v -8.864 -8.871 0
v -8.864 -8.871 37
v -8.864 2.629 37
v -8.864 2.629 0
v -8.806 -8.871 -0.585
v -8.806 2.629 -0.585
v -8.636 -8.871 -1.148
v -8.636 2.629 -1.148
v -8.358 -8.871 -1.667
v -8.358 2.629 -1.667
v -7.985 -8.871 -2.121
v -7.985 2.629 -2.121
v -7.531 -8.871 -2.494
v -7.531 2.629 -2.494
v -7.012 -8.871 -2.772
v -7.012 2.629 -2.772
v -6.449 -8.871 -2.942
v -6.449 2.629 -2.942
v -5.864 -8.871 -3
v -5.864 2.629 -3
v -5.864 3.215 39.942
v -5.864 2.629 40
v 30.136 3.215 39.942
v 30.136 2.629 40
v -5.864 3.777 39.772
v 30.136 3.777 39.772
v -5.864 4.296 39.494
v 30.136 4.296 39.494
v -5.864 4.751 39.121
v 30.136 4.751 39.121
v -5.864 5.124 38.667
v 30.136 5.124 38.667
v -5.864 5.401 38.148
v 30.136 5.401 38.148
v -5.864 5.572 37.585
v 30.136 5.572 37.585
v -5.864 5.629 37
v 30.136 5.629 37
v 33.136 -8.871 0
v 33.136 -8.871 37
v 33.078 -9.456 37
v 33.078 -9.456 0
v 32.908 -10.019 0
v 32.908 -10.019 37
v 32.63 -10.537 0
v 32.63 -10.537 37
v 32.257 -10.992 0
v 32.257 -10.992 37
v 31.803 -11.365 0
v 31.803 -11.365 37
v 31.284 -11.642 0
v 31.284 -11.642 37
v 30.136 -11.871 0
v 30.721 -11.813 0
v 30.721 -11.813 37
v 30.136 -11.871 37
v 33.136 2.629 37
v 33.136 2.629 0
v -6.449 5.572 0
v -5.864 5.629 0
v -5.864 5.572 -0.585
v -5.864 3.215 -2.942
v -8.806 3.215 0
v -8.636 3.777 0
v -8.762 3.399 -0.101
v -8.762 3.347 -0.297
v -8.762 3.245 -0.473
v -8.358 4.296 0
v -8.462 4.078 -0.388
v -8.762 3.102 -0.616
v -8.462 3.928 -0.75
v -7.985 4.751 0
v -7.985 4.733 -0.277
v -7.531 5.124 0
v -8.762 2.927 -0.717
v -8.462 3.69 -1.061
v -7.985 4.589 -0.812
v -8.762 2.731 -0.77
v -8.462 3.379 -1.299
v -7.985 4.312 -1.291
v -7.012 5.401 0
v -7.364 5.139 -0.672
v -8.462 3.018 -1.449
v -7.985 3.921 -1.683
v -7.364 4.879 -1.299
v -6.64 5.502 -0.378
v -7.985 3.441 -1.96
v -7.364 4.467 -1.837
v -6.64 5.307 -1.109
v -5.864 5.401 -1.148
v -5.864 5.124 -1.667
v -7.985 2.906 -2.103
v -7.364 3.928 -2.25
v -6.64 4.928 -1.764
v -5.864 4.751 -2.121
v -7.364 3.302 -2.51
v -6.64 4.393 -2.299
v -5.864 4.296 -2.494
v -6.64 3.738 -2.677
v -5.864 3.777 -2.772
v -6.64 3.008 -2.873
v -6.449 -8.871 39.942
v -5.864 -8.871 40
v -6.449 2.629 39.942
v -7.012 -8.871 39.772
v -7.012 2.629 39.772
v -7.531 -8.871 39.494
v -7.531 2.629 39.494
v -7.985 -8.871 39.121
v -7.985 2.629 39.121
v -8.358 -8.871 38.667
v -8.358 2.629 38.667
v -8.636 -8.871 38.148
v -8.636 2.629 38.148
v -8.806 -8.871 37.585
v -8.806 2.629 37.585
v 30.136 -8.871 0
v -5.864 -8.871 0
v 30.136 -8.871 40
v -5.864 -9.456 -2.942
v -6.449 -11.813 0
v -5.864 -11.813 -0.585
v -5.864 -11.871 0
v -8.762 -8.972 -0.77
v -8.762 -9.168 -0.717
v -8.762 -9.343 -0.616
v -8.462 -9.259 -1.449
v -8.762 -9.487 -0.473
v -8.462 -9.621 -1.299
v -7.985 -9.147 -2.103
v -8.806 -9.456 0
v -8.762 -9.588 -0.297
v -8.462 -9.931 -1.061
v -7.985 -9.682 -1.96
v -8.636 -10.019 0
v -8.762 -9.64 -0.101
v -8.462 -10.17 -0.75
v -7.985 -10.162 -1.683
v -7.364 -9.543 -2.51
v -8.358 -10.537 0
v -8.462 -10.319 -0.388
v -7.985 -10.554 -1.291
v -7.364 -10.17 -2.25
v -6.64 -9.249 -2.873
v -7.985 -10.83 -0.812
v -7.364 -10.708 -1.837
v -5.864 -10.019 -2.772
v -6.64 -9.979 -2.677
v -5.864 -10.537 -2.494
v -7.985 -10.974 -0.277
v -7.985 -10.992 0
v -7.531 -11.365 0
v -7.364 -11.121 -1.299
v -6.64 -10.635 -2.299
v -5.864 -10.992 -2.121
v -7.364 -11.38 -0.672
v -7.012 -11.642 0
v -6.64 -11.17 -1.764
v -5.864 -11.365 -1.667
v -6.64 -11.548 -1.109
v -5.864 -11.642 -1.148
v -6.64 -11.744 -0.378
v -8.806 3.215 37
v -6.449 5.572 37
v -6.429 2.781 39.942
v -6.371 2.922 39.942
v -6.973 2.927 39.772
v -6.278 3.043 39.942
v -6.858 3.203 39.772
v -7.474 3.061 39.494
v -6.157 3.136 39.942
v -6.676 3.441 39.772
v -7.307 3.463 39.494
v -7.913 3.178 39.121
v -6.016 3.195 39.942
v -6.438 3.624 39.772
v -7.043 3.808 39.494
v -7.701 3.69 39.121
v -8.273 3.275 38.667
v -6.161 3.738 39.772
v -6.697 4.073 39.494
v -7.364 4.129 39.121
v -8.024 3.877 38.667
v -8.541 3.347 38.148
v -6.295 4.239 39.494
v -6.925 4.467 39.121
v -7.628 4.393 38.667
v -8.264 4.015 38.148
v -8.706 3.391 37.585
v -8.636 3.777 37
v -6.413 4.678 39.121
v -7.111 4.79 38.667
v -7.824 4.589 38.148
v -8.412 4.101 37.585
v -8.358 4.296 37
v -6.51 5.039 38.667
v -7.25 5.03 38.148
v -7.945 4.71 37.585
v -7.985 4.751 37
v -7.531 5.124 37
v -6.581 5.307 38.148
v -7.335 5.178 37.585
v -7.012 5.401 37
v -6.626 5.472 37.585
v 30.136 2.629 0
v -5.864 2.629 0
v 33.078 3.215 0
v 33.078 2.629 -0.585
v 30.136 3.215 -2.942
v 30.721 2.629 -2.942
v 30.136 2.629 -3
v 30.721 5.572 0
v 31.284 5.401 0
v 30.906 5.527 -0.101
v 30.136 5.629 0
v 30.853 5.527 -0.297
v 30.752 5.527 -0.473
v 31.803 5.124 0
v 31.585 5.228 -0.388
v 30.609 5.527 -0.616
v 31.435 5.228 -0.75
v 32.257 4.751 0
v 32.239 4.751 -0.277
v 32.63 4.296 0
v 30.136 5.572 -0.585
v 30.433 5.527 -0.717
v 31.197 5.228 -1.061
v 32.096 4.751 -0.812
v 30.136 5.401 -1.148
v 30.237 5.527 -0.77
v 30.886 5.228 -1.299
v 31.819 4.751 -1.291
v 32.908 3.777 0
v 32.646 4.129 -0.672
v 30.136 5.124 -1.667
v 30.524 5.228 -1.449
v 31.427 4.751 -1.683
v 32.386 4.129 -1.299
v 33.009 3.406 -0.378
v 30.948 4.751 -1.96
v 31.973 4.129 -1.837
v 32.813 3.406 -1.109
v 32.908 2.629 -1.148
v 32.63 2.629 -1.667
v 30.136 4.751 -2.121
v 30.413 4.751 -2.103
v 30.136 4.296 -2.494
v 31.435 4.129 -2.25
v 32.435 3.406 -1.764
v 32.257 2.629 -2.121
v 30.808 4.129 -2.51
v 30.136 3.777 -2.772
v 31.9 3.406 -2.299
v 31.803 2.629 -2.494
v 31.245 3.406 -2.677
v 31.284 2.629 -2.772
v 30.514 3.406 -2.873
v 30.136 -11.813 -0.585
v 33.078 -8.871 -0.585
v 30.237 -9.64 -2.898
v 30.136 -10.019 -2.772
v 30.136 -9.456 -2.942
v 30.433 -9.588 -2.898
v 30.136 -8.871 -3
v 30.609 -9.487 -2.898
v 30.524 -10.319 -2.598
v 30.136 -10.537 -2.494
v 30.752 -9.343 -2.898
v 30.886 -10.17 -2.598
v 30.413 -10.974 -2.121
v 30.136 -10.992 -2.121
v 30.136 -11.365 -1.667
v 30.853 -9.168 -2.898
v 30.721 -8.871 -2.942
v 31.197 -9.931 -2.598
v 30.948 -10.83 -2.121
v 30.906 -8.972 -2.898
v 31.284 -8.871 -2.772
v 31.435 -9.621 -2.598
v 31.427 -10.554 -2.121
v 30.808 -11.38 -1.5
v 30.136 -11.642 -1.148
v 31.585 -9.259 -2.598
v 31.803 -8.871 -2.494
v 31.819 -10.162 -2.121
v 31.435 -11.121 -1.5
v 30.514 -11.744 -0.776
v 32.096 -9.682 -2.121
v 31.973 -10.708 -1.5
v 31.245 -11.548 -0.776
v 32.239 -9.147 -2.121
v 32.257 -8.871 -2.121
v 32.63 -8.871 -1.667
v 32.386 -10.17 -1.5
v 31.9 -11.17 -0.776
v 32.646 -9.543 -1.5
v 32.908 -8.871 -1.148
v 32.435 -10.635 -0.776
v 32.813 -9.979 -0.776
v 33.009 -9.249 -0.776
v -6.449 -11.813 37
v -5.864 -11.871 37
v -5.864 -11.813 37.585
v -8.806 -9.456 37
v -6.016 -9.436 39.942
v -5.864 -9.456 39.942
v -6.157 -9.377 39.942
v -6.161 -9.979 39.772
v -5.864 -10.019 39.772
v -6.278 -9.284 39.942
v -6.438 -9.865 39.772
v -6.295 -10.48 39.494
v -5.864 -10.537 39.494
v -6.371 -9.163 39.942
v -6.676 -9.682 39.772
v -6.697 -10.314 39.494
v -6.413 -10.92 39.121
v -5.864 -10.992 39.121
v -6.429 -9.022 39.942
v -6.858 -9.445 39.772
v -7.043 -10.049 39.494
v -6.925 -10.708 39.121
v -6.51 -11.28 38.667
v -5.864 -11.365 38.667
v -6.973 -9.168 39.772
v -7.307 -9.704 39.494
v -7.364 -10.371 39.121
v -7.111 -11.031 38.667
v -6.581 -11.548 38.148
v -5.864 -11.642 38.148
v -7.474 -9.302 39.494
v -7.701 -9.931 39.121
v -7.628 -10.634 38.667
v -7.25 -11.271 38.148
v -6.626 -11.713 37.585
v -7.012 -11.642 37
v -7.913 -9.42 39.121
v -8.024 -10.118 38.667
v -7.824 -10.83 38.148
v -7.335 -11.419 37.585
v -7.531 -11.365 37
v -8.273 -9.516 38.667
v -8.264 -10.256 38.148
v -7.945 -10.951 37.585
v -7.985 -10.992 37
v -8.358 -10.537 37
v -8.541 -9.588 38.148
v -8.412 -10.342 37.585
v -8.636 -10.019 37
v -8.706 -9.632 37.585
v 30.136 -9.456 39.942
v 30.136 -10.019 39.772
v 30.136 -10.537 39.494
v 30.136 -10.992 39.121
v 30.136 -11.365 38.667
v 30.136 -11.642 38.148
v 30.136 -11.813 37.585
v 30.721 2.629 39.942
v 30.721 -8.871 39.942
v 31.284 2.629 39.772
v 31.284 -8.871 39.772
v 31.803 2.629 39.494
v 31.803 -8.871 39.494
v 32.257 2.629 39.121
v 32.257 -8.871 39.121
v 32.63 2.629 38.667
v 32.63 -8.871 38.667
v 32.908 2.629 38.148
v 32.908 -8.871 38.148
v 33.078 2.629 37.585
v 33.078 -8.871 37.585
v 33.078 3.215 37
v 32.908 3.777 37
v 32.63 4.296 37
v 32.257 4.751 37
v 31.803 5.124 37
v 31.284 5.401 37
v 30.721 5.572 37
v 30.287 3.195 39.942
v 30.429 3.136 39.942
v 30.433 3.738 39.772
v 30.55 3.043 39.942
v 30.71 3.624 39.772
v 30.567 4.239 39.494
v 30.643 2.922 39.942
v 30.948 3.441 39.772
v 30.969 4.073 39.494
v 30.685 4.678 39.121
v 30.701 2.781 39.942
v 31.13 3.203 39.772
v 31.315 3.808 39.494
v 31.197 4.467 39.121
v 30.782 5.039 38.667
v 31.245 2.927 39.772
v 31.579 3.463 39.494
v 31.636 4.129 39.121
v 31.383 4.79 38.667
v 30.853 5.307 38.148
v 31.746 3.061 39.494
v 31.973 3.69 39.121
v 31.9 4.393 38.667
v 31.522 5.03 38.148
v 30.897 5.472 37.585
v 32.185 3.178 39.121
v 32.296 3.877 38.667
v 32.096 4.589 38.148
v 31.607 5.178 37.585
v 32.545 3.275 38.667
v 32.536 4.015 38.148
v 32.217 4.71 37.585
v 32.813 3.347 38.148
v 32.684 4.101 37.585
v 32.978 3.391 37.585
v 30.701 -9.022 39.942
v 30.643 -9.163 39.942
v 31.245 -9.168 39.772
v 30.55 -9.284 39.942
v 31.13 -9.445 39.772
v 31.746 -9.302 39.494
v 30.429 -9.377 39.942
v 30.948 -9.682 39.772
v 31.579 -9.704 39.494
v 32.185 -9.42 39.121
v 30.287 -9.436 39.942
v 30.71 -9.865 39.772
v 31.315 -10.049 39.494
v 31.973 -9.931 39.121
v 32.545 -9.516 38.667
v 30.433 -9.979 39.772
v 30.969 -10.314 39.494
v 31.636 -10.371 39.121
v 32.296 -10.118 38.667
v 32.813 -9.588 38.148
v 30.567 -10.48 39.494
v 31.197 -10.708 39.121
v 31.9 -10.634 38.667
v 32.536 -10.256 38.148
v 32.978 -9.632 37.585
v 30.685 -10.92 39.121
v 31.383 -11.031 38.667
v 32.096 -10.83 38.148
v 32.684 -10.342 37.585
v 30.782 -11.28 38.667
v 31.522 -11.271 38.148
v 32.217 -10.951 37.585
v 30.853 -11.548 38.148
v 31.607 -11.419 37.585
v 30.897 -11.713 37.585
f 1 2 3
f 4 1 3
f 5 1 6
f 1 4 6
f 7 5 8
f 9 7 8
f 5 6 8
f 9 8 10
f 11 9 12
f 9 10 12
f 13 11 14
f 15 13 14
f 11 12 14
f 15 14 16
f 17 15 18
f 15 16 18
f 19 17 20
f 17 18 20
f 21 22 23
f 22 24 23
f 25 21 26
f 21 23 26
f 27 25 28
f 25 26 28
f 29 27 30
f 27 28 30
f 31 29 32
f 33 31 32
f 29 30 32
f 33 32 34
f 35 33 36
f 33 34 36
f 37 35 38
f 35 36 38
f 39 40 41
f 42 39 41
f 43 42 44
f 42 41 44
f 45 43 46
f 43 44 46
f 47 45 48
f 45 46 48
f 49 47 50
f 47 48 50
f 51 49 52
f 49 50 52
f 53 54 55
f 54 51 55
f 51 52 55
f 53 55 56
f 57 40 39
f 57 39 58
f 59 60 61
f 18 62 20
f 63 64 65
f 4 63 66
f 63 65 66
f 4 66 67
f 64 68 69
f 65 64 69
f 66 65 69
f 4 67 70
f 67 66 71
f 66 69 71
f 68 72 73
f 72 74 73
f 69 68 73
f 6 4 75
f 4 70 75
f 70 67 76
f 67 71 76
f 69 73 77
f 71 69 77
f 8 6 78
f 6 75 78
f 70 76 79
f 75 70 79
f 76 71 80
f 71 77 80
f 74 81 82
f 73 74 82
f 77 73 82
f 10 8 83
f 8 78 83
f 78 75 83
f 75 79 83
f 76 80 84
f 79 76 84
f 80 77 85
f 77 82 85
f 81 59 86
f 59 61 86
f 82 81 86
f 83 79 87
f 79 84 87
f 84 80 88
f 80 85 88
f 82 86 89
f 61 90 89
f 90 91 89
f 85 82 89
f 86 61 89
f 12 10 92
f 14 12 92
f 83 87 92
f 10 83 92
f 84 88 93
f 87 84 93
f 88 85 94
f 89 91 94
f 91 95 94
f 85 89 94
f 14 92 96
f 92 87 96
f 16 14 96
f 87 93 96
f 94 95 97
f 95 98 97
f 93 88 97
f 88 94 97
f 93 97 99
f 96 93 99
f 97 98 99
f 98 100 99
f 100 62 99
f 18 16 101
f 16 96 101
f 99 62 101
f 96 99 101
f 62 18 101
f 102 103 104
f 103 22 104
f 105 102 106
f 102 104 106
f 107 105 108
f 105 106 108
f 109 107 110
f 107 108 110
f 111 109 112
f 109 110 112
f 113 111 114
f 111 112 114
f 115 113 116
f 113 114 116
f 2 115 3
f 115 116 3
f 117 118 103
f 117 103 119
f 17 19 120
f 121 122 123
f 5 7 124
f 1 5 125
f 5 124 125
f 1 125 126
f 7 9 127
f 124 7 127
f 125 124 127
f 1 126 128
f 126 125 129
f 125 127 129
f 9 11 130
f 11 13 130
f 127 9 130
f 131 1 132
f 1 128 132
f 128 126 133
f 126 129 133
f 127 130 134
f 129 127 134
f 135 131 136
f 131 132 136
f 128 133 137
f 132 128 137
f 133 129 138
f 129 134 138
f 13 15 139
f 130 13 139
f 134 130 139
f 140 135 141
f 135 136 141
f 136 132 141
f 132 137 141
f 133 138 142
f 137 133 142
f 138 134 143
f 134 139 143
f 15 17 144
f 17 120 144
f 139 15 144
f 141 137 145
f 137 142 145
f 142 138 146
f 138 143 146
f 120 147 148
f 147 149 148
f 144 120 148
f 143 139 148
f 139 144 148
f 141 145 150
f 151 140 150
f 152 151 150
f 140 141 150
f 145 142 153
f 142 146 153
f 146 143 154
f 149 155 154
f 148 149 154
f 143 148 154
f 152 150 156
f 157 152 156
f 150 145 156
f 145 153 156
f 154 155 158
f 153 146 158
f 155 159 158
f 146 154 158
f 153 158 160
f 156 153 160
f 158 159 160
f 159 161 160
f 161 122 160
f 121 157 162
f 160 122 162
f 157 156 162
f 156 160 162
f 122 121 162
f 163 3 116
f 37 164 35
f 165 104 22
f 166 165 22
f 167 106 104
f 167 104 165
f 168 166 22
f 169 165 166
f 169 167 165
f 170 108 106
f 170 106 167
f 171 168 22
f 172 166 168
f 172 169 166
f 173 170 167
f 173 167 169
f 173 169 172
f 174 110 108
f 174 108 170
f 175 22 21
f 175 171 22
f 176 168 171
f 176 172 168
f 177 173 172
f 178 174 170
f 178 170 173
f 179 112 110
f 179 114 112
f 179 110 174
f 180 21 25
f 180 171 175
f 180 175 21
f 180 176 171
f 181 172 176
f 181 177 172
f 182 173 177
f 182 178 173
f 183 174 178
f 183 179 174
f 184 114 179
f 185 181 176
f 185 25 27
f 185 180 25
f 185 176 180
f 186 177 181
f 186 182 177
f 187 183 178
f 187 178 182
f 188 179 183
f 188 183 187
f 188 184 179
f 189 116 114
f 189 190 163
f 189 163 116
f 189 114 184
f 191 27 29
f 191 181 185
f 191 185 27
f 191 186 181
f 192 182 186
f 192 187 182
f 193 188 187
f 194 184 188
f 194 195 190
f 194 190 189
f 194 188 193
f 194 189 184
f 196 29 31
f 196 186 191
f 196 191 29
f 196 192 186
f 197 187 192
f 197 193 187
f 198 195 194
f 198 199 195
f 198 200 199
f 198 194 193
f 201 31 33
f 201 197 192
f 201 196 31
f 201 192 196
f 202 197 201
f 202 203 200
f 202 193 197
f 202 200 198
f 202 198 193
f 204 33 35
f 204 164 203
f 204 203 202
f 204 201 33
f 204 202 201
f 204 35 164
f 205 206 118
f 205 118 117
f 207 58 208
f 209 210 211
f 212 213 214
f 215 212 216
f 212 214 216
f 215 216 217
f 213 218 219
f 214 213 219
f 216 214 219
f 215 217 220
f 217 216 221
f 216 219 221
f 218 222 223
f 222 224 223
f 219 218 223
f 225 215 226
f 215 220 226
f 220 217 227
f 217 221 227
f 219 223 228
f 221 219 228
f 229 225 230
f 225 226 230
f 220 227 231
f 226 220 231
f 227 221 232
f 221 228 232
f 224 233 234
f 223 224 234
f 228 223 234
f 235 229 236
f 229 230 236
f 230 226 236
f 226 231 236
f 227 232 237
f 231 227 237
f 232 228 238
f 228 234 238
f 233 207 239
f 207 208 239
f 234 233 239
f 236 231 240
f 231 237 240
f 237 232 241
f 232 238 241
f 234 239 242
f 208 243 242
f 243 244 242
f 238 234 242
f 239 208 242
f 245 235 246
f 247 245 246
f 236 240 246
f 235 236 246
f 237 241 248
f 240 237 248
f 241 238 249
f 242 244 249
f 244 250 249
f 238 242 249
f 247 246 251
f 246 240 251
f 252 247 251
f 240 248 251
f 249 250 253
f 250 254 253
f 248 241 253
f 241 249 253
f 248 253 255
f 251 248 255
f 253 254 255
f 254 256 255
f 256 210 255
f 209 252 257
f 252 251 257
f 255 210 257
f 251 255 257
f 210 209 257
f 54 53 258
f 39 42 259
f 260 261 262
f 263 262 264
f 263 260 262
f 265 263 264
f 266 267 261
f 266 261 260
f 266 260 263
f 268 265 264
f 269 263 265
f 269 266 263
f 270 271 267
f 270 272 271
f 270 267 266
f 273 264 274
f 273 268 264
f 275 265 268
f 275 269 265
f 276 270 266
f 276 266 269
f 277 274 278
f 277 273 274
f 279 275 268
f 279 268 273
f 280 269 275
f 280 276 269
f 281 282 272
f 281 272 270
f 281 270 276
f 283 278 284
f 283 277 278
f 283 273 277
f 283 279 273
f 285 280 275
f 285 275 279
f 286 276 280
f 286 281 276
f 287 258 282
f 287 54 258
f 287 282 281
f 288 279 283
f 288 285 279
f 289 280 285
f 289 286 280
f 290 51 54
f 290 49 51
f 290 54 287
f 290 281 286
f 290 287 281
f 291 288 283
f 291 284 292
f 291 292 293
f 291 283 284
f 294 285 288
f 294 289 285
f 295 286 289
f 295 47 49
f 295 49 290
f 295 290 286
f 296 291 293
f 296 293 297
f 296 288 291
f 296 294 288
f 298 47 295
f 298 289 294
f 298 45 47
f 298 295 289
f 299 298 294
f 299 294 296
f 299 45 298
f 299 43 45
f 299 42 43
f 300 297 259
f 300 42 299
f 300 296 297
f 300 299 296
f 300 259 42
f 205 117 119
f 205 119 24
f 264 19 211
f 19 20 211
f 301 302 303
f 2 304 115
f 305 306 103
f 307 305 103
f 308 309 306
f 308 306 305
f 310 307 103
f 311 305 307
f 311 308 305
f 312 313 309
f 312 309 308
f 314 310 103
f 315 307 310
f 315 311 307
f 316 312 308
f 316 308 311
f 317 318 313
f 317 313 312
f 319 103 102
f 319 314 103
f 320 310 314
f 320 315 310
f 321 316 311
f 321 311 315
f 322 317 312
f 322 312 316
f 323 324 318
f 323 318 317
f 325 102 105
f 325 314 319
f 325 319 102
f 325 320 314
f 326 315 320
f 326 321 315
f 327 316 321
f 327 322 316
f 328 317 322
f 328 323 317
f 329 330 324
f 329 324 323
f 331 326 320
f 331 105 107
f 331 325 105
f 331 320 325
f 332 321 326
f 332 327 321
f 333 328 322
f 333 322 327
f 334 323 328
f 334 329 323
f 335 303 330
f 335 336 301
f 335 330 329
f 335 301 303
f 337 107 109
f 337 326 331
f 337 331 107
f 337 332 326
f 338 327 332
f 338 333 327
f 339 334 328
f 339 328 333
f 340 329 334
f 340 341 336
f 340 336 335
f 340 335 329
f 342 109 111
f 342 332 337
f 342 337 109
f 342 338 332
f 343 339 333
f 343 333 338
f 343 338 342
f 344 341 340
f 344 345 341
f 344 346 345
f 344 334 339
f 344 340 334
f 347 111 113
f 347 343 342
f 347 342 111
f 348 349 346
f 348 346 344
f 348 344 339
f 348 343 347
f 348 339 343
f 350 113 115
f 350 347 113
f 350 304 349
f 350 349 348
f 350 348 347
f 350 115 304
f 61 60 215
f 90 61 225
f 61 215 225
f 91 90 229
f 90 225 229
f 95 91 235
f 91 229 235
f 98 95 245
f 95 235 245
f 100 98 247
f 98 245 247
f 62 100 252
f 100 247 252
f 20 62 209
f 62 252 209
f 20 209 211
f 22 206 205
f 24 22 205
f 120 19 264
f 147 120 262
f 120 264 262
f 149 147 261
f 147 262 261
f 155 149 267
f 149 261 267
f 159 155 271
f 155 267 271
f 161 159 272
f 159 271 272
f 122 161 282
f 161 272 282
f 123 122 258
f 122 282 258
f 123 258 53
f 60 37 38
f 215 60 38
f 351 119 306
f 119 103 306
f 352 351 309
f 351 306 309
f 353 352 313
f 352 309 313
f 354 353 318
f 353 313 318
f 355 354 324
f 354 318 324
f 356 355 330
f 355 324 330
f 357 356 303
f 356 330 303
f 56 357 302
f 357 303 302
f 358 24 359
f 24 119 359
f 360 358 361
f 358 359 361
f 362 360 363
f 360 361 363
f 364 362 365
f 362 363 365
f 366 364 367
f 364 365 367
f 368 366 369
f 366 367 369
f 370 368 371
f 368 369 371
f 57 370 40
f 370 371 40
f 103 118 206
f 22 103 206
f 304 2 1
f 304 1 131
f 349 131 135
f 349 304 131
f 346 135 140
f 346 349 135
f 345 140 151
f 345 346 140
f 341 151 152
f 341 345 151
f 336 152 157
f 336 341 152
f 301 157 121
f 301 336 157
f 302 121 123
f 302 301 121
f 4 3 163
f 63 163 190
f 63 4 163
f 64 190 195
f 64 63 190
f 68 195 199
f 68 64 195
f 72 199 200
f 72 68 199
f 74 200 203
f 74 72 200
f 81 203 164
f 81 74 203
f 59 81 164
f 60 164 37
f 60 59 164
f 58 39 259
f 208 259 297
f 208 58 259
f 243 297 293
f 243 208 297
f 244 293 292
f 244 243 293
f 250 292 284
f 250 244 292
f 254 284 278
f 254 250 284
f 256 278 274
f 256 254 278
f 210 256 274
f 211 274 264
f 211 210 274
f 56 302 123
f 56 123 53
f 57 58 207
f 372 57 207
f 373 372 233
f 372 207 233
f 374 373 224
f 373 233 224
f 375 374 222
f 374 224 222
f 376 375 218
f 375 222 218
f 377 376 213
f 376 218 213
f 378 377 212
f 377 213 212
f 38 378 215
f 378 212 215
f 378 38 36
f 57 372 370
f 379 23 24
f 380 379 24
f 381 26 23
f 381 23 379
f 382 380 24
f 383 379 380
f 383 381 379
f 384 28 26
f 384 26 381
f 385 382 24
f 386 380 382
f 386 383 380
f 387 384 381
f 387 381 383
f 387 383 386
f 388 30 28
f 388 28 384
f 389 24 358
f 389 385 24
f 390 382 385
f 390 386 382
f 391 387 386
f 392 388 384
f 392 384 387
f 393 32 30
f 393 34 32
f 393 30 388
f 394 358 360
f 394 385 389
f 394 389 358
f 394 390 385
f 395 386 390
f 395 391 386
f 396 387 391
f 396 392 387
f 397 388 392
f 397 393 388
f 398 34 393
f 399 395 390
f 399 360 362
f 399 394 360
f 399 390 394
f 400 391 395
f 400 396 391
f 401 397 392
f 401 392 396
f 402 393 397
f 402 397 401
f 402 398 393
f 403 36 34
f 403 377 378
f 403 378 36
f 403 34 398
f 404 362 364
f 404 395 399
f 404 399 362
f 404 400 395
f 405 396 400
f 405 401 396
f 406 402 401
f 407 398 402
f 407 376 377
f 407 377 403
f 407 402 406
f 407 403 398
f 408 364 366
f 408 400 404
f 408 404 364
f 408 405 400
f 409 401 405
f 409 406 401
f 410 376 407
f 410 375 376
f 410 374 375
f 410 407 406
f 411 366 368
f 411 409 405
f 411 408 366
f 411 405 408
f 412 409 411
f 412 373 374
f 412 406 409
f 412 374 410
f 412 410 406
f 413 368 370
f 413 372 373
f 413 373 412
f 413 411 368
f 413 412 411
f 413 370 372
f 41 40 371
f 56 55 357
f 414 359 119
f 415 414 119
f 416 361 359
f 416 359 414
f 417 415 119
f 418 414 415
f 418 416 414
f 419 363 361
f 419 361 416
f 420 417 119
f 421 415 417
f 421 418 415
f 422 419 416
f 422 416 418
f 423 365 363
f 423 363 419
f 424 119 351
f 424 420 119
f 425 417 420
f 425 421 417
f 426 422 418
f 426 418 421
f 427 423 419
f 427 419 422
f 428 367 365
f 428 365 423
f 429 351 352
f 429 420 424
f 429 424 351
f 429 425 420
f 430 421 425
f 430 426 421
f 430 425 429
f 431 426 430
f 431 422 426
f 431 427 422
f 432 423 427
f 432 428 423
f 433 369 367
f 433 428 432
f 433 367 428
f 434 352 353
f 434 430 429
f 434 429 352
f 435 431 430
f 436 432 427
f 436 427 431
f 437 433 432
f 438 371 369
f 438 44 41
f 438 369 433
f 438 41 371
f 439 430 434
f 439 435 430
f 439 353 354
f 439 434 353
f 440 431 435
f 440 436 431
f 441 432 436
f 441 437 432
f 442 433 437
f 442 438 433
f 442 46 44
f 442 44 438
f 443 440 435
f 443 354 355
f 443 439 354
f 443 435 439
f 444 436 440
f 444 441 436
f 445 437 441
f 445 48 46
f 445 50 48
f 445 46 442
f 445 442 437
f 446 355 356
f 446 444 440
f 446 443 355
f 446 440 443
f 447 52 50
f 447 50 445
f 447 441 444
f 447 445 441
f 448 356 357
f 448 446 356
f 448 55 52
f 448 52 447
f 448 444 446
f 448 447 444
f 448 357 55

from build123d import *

# Parameters (mm, degrees)
F0_W     = 42
F0_H     = 17.5
F0_W_2   = 36
F0_H_2   = 11.5
F1_DEPTH = 40
F2_DEPTH = 3
F3_R     = 3
F4_R     = 2.99999


# Not quite as in the source:
# - a fillet or chamfer is up to 0.001 mm smaller than in the source, because OpenCascade refuses the exact size


with BuildPart() as f1:
    # F0 (on Top) → F1 (new body)
    with BuildSketch(Plane.XY):
        with Locations((12.1359585822, -3.1205574796)):
            Rectangle(F0_W, F0_H)
        with Locations((12.1359585822, -3.1205574796)):
            Rectangle(F0_W_2, F0_H_2, mode=Mode.SUBTRACT)
    extrude(amount=F1_DEPTH)

    # F0 (on Top) → F2 (join)
    with BuildSketch(Plane.XY):
        with Locations((12.1359585822, -3.1205574796)):
            Rectangle(F0_W, F0_H)
        with Locations((12.1359585822, -3.1205574796)):
            Rectangle(F0_W_2, F0_H_2, mode=Mode.SUBTRACT)
        with Locations((12.1359585822, -3.1205574796)):
            Rectangle(F0_W_2, F0_H_2)
    extrude(amount=-F2_DEPTH)

    # F3
    f3_edges = [f1.edges().sort_by_distance(p)[0] for p in [
        (33.135959, -11.870557, 18.5),
        (12.135959, -11.870557, -3),
        (33.135959, -3.120557, -3),
        (33.135959, 5.629443, 18.5),
        (12.135959, 5.629443, -3),
        (-8.864041, 5.629443, 18.5),
        (-8.864041, -3.120557, -3),
        (-8.864041, -11.870557, 18.5),
    ]]
    fillet(f3_edges, radius=F3_R)

    # F4 (radius 3 in the source; OpenCascade refuses exactly that, so slightly less here)
    f4_edges = [f1.edges().sort_by_distance(p)[0] for p in [
        (12.135959, 5.629443, 40),
        (-8.864041, -3.120557, 40),
        (12.135959, -11.870557, 40),
        (33.135959, -3.120557, 40),
    ]]
    fillet(f4_edges, radius=F4_R)


solid = f1.part
